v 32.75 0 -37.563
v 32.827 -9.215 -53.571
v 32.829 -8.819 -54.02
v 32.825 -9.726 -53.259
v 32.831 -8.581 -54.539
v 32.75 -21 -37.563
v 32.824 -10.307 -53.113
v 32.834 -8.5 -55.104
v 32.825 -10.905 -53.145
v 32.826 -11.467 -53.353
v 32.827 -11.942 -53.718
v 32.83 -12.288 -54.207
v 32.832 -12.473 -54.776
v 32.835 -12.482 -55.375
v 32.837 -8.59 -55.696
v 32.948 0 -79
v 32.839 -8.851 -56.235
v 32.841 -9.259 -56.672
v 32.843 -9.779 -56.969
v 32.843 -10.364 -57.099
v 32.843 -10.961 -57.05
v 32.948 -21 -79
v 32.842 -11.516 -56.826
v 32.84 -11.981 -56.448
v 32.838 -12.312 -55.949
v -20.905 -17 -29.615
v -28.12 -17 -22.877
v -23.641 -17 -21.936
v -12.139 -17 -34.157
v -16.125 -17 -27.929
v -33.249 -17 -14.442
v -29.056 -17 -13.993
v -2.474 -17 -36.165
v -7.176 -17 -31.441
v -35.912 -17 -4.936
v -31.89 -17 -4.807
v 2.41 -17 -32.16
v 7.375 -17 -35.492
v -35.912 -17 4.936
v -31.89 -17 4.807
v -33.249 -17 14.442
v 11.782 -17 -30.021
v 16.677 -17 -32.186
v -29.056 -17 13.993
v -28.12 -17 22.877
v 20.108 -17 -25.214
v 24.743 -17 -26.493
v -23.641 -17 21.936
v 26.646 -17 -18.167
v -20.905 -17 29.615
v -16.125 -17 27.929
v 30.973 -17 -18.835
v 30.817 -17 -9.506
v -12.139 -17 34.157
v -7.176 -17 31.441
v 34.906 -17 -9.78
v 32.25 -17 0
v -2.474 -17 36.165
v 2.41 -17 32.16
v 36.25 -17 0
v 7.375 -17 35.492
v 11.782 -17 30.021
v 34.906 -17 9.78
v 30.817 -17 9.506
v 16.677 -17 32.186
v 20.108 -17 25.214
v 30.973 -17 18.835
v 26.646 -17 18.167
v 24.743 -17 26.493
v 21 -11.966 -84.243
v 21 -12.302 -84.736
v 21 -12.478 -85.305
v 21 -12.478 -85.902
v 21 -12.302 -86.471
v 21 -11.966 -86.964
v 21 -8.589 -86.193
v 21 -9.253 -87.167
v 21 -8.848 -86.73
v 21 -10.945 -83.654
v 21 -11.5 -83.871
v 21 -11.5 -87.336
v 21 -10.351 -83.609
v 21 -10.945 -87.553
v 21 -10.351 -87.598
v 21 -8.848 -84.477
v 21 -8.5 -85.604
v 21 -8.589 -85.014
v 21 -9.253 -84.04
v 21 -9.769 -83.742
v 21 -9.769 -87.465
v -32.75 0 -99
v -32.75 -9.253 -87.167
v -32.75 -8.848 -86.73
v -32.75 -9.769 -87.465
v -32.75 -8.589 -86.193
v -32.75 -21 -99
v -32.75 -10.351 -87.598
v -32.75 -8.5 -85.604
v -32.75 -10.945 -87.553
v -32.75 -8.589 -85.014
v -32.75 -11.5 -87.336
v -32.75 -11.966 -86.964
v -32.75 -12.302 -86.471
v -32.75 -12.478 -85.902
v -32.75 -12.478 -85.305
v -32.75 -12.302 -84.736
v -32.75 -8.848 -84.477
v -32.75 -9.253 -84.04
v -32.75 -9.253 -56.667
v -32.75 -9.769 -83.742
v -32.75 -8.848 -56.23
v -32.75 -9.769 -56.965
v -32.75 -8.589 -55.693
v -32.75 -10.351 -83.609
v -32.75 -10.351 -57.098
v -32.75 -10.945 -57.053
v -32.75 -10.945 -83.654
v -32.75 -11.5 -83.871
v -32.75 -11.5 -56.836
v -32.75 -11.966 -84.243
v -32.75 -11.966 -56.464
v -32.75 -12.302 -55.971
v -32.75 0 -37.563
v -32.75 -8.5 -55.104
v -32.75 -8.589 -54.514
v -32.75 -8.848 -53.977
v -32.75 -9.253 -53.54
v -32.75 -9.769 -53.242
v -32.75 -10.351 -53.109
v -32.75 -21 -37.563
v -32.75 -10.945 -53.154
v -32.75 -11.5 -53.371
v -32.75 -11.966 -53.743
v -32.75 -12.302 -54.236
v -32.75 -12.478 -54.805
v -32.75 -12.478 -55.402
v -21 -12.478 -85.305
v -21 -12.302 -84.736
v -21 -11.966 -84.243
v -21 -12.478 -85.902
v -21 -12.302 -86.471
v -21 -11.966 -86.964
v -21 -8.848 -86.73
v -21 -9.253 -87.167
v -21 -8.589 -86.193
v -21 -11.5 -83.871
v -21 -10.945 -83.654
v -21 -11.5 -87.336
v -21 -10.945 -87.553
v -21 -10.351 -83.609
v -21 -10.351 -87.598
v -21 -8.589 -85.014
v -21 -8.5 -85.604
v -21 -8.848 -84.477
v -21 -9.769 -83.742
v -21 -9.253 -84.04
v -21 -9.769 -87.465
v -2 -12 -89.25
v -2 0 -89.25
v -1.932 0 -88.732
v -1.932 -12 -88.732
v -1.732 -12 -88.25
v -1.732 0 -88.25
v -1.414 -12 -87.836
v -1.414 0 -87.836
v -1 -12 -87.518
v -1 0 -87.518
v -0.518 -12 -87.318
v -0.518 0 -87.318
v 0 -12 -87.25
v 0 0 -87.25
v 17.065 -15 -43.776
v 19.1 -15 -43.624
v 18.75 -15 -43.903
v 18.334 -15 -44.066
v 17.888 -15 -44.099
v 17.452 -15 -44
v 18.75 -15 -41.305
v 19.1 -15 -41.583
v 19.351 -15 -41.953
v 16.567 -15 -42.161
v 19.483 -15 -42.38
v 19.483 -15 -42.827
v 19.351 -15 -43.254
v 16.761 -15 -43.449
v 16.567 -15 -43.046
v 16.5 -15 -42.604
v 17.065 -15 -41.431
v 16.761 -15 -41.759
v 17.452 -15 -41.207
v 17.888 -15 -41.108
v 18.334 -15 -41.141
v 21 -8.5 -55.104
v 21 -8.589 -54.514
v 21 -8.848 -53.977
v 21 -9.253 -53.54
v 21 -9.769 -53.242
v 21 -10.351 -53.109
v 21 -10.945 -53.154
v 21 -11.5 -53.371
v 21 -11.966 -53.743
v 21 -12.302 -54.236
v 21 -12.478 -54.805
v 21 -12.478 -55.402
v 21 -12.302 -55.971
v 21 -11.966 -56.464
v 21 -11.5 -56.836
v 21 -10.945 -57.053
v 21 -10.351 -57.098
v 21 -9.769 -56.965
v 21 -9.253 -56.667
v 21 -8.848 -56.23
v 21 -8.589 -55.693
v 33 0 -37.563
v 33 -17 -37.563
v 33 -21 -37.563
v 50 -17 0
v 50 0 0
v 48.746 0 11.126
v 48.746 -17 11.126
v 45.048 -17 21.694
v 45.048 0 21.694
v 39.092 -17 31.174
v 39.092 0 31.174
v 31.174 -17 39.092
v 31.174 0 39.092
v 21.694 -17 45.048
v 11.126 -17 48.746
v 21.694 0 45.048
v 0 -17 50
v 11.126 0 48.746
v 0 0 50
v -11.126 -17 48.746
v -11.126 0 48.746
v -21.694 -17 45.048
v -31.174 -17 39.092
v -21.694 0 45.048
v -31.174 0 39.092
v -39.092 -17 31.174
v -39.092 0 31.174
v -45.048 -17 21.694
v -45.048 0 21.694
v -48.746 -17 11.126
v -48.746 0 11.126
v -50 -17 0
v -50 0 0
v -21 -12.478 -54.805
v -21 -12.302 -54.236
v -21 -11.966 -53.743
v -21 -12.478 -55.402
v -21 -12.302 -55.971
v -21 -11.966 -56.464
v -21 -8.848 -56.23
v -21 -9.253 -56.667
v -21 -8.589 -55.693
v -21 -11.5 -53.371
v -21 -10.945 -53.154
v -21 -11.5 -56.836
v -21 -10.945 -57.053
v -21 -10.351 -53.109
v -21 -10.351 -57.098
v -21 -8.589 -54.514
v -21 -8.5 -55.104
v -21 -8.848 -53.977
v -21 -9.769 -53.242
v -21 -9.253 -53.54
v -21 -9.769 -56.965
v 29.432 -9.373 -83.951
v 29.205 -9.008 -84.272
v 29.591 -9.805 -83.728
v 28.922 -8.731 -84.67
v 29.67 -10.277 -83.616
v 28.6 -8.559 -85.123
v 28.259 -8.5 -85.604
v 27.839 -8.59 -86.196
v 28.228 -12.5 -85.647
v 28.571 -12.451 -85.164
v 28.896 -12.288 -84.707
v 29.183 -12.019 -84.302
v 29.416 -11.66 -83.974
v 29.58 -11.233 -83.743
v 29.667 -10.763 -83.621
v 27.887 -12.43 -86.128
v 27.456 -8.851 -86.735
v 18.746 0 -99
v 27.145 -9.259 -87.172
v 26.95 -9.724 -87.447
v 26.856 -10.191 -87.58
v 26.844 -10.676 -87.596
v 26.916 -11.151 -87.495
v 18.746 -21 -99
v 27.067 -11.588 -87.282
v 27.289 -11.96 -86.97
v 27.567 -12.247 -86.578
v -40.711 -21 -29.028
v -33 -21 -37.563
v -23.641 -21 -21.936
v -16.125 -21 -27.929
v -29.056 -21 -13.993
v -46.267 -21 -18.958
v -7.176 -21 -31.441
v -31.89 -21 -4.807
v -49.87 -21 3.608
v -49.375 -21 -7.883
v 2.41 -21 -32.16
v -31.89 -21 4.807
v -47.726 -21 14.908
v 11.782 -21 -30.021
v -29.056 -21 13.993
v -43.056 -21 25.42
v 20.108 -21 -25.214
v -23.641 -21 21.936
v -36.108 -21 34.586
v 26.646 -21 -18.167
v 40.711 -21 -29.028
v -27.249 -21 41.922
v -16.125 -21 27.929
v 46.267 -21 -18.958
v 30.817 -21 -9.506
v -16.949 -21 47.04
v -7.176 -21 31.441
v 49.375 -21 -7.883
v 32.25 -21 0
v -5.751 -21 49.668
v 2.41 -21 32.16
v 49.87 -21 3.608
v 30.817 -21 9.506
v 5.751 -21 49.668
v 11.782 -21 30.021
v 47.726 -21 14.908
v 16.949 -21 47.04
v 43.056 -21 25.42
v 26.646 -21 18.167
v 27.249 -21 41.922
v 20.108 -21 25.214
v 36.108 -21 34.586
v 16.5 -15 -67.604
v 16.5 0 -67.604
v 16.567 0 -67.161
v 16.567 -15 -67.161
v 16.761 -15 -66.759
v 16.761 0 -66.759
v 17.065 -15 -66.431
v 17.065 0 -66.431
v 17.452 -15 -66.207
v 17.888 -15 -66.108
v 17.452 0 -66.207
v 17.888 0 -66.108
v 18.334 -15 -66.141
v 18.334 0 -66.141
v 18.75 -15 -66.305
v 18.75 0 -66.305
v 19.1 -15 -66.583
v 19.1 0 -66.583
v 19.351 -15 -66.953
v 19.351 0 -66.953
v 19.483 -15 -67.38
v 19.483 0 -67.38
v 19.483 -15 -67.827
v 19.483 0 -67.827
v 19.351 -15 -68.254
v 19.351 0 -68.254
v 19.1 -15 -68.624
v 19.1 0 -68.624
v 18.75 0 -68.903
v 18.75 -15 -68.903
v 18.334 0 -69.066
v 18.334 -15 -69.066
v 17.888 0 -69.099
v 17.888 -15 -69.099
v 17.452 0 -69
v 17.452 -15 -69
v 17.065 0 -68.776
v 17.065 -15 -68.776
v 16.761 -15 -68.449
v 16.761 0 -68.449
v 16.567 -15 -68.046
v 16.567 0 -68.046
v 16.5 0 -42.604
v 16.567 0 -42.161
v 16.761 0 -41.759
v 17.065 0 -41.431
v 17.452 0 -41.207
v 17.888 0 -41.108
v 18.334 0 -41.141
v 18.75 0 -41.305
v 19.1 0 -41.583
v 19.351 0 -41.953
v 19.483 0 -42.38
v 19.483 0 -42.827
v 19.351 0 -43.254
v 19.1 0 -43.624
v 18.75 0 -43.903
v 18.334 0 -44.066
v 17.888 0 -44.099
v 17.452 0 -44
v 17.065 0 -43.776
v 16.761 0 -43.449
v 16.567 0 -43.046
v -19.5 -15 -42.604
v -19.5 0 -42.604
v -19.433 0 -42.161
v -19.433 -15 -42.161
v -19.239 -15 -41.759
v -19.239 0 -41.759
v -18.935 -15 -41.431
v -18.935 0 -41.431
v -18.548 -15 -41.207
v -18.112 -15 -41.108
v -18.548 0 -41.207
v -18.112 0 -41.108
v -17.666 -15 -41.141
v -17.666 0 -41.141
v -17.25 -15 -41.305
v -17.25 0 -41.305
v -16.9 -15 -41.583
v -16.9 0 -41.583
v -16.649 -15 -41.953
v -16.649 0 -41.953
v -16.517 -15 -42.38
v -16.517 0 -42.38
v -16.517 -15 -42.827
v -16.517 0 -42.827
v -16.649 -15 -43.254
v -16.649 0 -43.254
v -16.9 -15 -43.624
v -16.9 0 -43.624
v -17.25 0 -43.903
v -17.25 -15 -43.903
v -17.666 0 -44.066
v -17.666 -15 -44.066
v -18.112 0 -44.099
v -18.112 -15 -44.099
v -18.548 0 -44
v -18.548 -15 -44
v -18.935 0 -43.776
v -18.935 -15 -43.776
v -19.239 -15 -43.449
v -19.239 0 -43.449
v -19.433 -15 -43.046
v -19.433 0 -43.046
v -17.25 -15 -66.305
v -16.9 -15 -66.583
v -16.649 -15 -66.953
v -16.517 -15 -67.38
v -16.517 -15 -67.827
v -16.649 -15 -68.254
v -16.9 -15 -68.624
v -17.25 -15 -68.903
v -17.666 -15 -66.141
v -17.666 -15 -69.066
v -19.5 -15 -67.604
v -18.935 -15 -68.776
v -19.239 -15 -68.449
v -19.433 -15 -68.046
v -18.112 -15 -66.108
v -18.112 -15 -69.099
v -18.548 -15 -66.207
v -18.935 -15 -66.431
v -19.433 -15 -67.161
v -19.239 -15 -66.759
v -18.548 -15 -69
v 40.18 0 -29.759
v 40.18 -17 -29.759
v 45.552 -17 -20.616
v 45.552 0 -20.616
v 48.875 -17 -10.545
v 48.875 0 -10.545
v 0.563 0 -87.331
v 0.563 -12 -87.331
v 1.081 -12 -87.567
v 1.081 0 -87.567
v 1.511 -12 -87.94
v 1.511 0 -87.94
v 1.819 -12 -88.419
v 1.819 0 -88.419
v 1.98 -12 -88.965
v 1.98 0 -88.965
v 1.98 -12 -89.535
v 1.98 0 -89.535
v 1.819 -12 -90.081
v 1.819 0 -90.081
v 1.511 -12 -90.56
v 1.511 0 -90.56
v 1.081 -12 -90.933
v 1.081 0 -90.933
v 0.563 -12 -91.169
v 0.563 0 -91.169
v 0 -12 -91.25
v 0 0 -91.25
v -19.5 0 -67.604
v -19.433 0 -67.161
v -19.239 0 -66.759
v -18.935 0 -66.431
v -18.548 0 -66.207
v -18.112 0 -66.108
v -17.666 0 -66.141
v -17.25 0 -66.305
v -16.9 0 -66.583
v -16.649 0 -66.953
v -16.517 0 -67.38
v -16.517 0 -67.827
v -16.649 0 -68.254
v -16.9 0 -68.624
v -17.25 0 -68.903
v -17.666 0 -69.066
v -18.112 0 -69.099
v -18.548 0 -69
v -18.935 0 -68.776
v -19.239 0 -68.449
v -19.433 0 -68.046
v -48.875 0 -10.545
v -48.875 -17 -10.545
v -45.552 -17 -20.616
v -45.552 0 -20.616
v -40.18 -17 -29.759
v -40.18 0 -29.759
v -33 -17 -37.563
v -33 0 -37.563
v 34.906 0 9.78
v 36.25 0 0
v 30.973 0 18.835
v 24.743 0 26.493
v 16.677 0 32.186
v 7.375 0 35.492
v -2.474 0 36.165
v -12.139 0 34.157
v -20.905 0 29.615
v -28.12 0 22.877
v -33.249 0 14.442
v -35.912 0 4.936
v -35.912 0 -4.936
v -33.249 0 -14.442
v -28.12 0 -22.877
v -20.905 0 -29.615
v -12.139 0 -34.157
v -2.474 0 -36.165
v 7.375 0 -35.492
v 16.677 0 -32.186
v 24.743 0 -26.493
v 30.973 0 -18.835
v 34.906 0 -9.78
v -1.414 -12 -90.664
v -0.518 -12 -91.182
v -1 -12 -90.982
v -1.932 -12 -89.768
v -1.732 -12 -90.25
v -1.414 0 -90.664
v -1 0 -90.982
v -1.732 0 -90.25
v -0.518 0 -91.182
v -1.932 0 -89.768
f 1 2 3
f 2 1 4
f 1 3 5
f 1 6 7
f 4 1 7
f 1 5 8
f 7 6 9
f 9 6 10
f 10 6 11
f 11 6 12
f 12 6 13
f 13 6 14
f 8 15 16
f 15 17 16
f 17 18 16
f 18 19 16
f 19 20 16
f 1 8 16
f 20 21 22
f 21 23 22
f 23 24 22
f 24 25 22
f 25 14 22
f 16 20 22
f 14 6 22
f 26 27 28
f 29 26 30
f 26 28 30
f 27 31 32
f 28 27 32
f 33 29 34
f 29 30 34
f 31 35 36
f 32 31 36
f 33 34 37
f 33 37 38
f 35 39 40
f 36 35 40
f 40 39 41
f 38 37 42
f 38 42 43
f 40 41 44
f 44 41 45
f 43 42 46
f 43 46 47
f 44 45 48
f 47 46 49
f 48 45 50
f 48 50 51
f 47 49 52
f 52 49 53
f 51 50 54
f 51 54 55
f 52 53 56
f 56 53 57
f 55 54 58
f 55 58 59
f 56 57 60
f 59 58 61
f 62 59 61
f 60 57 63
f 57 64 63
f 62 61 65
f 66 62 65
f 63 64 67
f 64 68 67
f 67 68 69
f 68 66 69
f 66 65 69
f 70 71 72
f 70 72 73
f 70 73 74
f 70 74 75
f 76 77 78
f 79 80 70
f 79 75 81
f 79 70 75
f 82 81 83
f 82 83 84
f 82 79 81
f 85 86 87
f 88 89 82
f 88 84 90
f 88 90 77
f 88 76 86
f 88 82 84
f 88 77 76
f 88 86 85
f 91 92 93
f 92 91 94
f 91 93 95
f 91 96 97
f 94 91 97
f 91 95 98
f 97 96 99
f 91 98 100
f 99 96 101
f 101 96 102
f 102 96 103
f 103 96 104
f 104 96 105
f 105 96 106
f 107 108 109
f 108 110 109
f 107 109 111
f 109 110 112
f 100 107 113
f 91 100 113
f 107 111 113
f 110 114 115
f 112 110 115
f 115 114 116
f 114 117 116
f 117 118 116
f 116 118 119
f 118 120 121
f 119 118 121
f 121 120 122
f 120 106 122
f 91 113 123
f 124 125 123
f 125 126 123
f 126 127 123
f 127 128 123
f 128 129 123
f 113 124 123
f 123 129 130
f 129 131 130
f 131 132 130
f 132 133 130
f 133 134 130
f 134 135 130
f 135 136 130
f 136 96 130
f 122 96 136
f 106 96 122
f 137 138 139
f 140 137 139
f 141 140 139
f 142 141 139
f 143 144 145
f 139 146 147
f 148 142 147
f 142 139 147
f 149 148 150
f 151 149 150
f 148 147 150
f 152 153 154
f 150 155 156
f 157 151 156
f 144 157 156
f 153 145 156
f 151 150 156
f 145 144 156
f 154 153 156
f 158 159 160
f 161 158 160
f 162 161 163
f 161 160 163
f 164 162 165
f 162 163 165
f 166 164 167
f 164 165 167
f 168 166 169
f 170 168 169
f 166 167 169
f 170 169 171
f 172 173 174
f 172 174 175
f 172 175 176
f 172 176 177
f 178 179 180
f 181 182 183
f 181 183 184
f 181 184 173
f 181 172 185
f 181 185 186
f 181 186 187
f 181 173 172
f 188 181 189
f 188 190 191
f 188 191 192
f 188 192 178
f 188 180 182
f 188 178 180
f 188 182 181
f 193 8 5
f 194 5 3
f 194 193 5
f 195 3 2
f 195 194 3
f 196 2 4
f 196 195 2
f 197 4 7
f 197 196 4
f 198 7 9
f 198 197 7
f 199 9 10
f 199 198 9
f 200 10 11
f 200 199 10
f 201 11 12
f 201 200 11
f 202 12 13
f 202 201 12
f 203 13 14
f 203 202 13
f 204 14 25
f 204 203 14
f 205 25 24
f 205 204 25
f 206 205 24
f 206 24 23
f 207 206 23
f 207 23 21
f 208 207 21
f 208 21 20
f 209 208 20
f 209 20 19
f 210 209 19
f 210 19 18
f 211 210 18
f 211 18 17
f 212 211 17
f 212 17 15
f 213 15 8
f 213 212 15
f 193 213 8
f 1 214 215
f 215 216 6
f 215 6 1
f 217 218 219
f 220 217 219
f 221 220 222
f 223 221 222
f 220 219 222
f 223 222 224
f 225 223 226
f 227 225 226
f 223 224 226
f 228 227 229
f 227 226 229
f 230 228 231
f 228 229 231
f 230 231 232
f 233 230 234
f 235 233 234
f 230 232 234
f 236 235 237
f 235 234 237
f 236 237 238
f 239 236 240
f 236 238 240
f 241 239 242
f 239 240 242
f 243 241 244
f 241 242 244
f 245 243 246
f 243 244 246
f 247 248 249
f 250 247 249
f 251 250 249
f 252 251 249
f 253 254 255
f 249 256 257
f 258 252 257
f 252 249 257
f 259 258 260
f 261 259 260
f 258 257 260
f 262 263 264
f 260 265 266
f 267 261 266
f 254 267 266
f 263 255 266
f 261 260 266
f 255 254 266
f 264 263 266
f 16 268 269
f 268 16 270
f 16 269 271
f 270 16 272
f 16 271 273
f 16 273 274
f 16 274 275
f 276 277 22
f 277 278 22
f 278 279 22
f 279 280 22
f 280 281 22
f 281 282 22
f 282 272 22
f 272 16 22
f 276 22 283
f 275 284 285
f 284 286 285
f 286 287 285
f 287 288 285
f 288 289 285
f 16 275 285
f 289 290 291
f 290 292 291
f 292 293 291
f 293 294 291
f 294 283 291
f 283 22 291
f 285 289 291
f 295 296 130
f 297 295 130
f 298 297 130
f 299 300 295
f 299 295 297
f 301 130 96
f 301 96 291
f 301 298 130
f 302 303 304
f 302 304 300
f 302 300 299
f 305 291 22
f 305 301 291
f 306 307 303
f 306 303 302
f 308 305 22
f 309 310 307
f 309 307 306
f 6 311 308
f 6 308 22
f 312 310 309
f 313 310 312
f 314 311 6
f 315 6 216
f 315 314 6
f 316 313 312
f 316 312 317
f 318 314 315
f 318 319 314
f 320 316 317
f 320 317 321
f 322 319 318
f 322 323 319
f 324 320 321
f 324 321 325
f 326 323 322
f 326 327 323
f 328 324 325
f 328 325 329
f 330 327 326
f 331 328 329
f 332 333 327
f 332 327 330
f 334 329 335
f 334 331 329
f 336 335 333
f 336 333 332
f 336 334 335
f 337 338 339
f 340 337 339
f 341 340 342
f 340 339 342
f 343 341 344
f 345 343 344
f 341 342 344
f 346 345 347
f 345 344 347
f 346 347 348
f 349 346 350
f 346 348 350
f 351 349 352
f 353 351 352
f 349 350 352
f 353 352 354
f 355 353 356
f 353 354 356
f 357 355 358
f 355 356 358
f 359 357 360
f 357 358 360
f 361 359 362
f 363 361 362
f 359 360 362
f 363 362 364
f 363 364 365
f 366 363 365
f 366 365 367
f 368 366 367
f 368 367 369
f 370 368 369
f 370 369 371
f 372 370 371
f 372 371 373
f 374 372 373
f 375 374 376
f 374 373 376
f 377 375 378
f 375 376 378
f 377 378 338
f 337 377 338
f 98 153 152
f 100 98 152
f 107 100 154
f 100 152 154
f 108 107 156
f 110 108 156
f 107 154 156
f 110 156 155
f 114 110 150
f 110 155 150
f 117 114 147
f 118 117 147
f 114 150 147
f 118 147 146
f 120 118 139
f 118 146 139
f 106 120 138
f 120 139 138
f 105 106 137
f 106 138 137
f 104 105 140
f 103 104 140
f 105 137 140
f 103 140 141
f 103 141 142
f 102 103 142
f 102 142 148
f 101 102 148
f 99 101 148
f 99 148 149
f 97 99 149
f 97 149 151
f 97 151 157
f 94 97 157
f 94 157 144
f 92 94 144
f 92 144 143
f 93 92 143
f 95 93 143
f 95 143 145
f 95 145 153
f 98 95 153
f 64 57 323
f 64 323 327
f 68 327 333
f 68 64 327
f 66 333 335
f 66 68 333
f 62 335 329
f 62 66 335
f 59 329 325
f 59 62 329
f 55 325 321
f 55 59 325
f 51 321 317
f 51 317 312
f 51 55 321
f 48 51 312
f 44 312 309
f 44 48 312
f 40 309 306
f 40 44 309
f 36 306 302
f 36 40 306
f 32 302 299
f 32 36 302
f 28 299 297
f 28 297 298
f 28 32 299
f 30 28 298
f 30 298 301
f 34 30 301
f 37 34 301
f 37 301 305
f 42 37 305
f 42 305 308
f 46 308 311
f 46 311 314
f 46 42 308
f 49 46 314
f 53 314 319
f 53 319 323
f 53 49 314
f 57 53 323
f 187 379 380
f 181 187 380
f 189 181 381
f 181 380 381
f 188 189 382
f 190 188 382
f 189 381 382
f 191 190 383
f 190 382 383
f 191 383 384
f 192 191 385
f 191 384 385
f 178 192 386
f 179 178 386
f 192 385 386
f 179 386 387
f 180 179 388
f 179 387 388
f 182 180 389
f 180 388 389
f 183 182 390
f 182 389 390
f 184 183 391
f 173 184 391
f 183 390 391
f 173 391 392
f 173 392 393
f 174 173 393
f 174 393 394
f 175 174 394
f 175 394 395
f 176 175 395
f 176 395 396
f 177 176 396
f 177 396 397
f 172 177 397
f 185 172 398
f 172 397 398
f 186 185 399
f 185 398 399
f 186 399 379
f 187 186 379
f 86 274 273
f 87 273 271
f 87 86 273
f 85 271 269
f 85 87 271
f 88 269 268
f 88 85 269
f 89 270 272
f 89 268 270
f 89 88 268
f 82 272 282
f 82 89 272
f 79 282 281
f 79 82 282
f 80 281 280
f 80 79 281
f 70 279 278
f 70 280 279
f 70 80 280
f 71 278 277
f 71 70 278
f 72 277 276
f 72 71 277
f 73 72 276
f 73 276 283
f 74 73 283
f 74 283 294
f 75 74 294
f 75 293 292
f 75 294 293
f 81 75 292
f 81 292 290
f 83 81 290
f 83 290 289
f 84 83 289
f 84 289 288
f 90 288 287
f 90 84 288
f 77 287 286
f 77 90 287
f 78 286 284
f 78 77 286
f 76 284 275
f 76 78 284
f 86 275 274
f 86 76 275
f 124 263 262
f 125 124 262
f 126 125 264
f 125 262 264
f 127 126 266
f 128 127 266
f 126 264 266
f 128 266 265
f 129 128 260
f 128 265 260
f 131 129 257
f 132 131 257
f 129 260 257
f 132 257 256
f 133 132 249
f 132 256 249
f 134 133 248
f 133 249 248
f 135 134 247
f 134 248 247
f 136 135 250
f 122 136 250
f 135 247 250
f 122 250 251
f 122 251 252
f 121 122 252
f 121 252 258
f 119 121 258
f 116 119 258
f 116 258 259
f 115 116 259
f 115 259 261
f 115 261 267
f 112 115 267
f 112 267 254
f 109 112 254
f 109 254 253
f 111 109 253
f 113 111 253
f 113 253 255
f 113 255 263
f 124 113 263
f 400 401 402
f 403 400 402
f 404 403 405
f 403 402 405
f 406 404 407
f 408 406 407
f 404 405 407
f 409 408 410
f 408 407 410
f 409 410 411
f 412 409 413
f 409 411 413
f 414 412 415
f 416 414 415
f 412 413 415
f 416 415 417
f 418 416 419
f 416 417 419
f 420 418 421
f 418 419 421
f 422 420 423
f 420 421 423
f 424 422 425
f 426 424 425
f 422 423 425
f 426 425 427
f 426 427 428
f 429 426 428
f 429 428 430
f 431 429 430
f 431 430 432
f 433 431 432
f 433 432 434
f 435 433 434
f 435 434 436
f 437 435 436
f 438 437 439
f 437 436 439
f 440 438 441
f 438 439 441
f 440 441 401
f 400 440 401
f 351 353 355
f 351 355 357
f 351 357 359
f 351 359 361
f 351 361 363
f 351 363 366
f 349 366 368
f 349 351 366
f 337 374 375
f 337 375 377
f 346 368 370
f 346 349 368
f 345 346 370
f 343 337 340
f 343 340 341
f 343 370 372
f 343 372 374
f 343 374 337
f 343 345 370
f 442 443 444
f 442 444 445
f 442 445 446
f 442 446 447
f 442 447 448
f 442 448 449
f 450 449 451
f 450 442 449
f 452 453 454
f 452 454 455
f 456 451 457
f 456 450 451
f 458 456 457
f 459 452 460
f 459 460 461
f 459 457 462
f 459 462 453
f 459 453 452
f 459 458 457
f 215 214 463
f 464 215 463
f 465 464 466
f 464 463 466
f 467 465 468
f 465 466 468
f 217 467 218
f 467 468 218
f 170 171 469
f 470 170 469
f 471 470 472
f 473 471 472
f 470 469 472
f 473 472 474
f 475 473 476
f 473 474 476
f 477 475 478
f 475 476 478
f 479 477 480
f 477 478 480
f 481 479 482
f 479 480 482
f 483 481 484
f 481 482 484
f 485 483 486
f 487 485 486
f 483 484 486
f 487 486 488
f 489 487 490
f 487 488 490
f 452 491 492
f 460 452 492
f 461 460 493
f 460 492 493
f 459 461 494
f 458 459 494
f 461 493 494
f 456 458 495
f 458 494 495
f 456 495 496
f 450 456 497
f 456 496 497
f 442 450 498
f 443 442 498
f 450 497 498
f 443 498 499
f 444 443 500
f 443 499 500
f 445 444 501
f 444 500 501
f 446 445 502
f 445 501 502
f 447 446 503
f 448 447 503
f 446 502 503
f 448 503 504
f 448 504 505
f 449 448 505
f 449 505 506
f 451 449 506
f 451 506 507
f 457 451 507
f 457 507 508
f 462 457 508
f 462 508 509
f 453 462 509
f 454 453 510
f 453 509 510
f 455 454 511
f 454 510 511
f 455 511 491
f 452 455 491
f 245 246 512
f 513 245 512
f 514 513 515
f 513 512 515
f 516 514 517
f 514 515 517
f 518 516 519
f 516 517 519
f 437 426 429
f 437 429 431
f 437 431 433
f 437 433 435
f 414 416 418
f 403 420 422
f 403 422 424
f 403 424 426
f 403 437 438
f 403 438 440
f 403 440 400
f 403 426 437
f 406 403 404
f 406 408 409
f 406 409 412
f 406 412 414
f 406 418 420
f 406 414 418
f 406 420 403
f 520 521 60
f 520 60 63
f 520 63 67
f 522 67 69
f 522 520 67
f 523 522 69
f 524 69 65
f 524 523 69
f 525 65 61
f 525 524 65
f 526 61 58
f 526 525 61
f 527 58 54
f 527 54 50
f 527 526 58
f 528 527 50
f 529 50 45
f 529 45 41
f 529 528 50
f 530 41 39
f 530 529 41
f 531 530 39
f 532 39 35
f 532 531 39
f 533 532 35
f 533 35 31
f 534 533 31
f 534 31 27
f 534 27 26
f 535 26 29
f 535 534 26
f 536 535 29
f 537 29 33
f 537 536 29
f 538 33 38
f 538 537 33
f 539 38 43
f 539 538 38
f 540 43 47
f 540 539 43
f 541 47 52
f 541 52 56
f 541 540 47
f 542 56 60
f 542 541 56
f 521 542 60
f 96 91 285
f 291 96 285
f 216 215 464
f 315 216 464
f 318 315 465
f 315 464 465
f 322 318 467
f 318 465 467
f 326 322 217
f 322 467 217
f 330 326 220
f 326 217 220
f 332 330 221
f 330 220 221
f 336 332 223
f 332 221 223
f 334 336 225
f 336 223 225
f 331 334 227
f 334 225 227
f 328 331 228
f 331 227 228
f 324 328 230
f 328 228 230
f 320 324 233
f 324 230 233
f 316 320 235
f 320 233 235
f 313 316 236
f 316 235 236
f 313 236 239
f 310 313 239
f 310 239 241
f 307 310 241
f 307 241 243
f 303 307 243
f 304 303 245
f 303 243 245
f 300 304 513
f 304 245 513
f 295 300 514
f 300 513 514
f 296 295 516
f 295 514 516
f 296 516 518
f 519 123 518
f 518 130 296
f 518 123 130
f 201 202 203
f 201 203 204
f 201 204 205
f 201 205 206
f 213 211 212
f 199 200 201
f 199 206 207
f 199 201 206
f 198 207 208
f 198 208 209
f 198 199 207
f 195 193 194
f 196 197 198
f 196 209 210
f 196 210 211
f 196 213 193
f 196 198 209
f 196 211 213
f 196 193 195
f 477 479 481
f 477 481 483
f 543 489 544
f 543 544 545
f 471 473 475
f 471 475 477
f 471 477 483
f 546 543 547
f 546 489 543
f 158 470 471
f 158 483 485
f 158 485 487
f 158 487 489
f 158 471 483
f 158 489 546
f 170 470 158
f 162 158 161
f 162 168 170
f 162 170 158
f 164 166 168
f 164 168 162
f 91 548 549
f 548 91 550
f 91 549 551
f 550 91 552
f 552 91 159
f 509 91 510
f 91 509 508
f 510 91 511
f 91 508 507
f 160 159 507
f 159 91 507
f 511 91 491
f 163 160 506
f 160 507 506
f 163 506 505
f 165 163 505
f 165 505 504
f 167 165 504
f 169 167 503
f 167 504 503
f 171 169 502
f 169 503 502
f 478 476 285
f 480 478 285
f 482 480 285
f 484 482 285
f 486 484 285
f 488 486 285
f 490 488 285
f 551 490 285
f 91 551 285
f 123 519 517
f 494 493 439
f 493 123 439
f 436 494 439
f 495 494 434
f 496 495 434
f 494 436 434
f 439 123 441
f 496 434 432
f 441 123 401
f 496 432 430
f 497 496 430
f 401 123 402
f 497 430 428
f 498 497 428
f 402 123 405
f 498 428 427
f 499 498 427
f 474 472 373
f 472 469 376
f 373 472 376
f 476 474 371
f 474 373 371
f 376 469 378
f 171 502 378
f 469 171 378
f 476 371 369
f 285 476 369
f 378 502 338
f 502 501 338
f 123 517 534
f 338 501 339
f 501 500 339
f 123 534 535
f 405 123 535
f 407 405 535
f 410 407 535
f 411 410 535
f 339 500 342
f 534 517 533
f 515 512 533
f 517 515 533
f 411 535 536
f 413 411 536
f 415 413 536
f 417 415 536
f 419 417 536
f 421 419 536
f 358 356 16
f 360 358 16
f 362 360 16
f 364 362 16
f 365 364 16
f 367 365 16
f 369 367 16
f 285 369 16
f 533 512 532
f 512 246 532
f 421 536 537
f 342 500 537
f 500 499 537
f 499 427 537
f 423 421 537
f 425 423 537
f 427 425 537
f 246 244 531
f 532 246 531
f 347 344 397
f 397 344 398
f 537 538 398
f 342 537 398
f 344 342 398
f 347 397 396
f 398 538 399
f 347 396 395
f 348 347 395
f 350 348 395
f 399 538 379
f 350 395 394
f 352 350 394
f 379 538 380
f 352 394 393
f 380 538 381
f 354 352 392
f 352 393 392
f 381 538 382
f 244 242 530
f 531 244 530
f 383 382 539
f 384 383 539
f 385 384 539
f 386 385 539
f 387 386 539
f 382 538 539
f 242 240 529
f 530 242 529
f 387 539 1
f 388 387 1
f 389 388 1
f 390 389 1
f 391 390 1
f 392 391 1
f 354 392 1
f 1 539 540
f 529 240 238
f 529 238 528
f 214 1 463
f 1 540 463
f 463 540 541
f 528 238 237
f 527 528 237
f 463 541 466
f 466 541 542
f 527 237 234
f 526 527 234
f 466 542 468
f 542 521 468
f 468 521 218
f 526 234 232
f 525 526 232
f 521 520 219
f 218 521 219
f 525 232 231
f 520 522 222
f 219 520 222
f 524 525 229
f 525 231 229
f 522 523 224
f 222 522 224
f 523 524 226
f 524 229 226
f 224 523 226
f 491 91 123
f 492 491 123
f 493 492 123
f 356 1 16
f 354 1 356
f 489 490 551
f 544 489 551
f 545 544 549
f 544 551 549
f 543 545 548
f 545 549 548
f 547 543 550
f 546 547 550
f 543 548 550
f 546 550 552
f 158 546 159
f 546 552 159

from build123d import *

# Parameters (mm, degrees)
F0_R      = 36.25
F1_DEPTH  = 17
F2_R      = 32.25
F3_DEPTH  = 4
F4_R      = 1.5
F5_DEPTH  = 15
F8_DEPTH  = 25
F11_DEPTH = 25
F13_DEPTH = 12
F15_DEPTH = 25


with BuildPart() as f1:
    # F0 (on Front) → F1 (new body)
    with BuildSketch(Plane.XZ):
        with BuildLine():
            ThreePointArc((33, -37.56328), (45.552168, -20.615528), (50, 0))
            ThreePointArc((50, 0), (0, 50), (-50, 0))
            ThreePointArc((-50, 0), (-45.552168, -20.615528), (-33, -37.56328))
            Line((-33, -37.56328), (-33, -79))
            Line((-33, -79), (-33, -99))
            Line((-33, -99), (-18.995849, -99))
            Line((-18.995849, -99), (0, -99))
            Line((0, -99), (18.995849, -99))
            Line((18.995849, -99), (33, -79))
            Line((33, -79), (33, -37.56328))
        make_face()
        Circle(F0_R, mode=Mode.SUBTRACT)
    extrude(amount=F1_DEPTH)

    # F2 (on face) → F3 (join)
    with BuildSketch(Plane.XZ.offset(17)):
        with BuildLine():
            Line((33, -79), (33, -37.56328))
            ThreePointArc((33, -37.56328), (0, 50), (-33, -37.56328))
            Line((-33, -37.56328), (-33, -99))
            Line((-33, -99), (18.995849, -99))
            Line((18.995849, -99), (33, -79))
        make_face()
        Circle(F2_R, mode=Mode.SUBTRACT)
    extrude(amount=F3_DEPTH)

    # F4 (on face) → F5 (cut)
    with BuildSketch(Plane(origin=(0, 0, 0), x_dir=(-1, 0, 0), z_dir=(0, 1, 0))):
        with Locations((-18, -42.60355)):
            Circle(F4_R)
        with Locations((18, -42.60355)):
            Circle(F4_R)
        with Locations((18, -67.60355)):
            Circle(F4_R)
        with Locations((-18, -67.60355)):
            Circle(F4_R)
    extrude(amount=-F5_DEPTH, mode=Mode.SUBTRACT)

    # F7 (on offset) → F8 (cut)
    with BuildSketch(Plane.YZ.offset(21)):
        with BuildLine():
            ThreePointArc((-12.5, -85.60355), (-10.5, -87.60355), (-8.5, -85.60355))
            Line((-8.5, -85.60355), (-12.5, -85.60355))
        make_face()
        with BuildLine():
            Line((-12.5, -85.60355), (-8.5, -85.60355))
            ThreePointArc((-8.5, -85.60355), (-10.5, -83.60355), (-12.5, -85.60355))
        make_face()
        with BuildLine():
            ThreePointArc((-12.5, -55.10355), (-10.5, -57.10355), (-8.5, -55.10355))
            Line((-8.5, -55.10355), (-12.5, -55.10355))
        make_face()
        with BuildLine():
            Line((-12.5, -55.10355), (-8.5, -55.10355))
            ThreePointArc((-8.5, -55.10355), (-10.5, -53.10355), (-12.5, -55.10355))
        make_face()
    extrude(amount=F8_DEPTH, mode=Mode.SUBTRACT)

    # F10 (on offset) → F11 (cut)
    with BuildSketch(Plane.YZ.offset(-21)):
        with BuildLine():
            ThreePointArc((-12.5, -85.60355), (-10.5, -87.60355), (-8.5, -85.60355))
            Line((-8.5, -85.60355), (-12.5, -85.60355))
        make_face()
        with BuildLine():
            Line((-12.5, -85.60355), (-8.5, -85.60355))
            ThreePointArc((-8.5, -85.60355), (-10.5, -83.60355), (-12.5, -85.60355))
        make_face()
        with BuildLine():
            ThreePointArc((-12.5, -55.10355), (-10.5, -57.10355), (-8.5, -55.10355))
            Line((-8.5, -55.10355), (-12.5, -55.10355))
        make_face()
        with BuildLine():
            Line((-12.5, -55.10355), (-8.5, -55.10355))
            ThreePointArc((-8.5, -55.10355), (-10.5, -53.10355), (-12.5, -55.10355))
        make_face()
    extrude(amount=-F11_DEPTH, mode=Mode.SUBTRACT)

    # F12 (on face) → F13 (cut)
    with BuildSketch(Plane(origin=(0, 0, 0), x_dir=(-1, 0, 0), z_dir=(0, 1, 0))):
        with BuildLine():
            ThreePointArc((0, -87.25), (-2, -89.25), (0, -91.25))
            Line((0, -91.25), (0, -87.25))
        make_face()
        with BuildLine():
            Line((0, -87.25), (0, -91.25))
            ThreePointArc((0, -91.25), (1.414214, -90.664214), (2, -89.25))
            ThreePointArc((2, -89.25), (1.414214, -87.835786), (0, -87.25))
        make_face()
    extrude(amount=-F13_DEPTH, mode=Mode.SUBTRACT)

    # F14 (on face) → F15 (cut)
    with BuildSketch(Plane.XZ.offset(21)):
        Polygon((38.998518, -37.56328), (33, -37.56328), (32.75, -37.56328), (32.948155, -79.000248), (18.745849, -99), (-32.75, -103.90038), (-32.75, -37.56328), (-33, -37.56328), (-37.546977, -48.766561), (-37.546977, -109.624594), (30.626951, -103.313722), (38.998518, -80.774888), align=None)
    extrude(amount=-F15_DEPTH, mode=Mode.SUBTRACT)


solid = f1.part
